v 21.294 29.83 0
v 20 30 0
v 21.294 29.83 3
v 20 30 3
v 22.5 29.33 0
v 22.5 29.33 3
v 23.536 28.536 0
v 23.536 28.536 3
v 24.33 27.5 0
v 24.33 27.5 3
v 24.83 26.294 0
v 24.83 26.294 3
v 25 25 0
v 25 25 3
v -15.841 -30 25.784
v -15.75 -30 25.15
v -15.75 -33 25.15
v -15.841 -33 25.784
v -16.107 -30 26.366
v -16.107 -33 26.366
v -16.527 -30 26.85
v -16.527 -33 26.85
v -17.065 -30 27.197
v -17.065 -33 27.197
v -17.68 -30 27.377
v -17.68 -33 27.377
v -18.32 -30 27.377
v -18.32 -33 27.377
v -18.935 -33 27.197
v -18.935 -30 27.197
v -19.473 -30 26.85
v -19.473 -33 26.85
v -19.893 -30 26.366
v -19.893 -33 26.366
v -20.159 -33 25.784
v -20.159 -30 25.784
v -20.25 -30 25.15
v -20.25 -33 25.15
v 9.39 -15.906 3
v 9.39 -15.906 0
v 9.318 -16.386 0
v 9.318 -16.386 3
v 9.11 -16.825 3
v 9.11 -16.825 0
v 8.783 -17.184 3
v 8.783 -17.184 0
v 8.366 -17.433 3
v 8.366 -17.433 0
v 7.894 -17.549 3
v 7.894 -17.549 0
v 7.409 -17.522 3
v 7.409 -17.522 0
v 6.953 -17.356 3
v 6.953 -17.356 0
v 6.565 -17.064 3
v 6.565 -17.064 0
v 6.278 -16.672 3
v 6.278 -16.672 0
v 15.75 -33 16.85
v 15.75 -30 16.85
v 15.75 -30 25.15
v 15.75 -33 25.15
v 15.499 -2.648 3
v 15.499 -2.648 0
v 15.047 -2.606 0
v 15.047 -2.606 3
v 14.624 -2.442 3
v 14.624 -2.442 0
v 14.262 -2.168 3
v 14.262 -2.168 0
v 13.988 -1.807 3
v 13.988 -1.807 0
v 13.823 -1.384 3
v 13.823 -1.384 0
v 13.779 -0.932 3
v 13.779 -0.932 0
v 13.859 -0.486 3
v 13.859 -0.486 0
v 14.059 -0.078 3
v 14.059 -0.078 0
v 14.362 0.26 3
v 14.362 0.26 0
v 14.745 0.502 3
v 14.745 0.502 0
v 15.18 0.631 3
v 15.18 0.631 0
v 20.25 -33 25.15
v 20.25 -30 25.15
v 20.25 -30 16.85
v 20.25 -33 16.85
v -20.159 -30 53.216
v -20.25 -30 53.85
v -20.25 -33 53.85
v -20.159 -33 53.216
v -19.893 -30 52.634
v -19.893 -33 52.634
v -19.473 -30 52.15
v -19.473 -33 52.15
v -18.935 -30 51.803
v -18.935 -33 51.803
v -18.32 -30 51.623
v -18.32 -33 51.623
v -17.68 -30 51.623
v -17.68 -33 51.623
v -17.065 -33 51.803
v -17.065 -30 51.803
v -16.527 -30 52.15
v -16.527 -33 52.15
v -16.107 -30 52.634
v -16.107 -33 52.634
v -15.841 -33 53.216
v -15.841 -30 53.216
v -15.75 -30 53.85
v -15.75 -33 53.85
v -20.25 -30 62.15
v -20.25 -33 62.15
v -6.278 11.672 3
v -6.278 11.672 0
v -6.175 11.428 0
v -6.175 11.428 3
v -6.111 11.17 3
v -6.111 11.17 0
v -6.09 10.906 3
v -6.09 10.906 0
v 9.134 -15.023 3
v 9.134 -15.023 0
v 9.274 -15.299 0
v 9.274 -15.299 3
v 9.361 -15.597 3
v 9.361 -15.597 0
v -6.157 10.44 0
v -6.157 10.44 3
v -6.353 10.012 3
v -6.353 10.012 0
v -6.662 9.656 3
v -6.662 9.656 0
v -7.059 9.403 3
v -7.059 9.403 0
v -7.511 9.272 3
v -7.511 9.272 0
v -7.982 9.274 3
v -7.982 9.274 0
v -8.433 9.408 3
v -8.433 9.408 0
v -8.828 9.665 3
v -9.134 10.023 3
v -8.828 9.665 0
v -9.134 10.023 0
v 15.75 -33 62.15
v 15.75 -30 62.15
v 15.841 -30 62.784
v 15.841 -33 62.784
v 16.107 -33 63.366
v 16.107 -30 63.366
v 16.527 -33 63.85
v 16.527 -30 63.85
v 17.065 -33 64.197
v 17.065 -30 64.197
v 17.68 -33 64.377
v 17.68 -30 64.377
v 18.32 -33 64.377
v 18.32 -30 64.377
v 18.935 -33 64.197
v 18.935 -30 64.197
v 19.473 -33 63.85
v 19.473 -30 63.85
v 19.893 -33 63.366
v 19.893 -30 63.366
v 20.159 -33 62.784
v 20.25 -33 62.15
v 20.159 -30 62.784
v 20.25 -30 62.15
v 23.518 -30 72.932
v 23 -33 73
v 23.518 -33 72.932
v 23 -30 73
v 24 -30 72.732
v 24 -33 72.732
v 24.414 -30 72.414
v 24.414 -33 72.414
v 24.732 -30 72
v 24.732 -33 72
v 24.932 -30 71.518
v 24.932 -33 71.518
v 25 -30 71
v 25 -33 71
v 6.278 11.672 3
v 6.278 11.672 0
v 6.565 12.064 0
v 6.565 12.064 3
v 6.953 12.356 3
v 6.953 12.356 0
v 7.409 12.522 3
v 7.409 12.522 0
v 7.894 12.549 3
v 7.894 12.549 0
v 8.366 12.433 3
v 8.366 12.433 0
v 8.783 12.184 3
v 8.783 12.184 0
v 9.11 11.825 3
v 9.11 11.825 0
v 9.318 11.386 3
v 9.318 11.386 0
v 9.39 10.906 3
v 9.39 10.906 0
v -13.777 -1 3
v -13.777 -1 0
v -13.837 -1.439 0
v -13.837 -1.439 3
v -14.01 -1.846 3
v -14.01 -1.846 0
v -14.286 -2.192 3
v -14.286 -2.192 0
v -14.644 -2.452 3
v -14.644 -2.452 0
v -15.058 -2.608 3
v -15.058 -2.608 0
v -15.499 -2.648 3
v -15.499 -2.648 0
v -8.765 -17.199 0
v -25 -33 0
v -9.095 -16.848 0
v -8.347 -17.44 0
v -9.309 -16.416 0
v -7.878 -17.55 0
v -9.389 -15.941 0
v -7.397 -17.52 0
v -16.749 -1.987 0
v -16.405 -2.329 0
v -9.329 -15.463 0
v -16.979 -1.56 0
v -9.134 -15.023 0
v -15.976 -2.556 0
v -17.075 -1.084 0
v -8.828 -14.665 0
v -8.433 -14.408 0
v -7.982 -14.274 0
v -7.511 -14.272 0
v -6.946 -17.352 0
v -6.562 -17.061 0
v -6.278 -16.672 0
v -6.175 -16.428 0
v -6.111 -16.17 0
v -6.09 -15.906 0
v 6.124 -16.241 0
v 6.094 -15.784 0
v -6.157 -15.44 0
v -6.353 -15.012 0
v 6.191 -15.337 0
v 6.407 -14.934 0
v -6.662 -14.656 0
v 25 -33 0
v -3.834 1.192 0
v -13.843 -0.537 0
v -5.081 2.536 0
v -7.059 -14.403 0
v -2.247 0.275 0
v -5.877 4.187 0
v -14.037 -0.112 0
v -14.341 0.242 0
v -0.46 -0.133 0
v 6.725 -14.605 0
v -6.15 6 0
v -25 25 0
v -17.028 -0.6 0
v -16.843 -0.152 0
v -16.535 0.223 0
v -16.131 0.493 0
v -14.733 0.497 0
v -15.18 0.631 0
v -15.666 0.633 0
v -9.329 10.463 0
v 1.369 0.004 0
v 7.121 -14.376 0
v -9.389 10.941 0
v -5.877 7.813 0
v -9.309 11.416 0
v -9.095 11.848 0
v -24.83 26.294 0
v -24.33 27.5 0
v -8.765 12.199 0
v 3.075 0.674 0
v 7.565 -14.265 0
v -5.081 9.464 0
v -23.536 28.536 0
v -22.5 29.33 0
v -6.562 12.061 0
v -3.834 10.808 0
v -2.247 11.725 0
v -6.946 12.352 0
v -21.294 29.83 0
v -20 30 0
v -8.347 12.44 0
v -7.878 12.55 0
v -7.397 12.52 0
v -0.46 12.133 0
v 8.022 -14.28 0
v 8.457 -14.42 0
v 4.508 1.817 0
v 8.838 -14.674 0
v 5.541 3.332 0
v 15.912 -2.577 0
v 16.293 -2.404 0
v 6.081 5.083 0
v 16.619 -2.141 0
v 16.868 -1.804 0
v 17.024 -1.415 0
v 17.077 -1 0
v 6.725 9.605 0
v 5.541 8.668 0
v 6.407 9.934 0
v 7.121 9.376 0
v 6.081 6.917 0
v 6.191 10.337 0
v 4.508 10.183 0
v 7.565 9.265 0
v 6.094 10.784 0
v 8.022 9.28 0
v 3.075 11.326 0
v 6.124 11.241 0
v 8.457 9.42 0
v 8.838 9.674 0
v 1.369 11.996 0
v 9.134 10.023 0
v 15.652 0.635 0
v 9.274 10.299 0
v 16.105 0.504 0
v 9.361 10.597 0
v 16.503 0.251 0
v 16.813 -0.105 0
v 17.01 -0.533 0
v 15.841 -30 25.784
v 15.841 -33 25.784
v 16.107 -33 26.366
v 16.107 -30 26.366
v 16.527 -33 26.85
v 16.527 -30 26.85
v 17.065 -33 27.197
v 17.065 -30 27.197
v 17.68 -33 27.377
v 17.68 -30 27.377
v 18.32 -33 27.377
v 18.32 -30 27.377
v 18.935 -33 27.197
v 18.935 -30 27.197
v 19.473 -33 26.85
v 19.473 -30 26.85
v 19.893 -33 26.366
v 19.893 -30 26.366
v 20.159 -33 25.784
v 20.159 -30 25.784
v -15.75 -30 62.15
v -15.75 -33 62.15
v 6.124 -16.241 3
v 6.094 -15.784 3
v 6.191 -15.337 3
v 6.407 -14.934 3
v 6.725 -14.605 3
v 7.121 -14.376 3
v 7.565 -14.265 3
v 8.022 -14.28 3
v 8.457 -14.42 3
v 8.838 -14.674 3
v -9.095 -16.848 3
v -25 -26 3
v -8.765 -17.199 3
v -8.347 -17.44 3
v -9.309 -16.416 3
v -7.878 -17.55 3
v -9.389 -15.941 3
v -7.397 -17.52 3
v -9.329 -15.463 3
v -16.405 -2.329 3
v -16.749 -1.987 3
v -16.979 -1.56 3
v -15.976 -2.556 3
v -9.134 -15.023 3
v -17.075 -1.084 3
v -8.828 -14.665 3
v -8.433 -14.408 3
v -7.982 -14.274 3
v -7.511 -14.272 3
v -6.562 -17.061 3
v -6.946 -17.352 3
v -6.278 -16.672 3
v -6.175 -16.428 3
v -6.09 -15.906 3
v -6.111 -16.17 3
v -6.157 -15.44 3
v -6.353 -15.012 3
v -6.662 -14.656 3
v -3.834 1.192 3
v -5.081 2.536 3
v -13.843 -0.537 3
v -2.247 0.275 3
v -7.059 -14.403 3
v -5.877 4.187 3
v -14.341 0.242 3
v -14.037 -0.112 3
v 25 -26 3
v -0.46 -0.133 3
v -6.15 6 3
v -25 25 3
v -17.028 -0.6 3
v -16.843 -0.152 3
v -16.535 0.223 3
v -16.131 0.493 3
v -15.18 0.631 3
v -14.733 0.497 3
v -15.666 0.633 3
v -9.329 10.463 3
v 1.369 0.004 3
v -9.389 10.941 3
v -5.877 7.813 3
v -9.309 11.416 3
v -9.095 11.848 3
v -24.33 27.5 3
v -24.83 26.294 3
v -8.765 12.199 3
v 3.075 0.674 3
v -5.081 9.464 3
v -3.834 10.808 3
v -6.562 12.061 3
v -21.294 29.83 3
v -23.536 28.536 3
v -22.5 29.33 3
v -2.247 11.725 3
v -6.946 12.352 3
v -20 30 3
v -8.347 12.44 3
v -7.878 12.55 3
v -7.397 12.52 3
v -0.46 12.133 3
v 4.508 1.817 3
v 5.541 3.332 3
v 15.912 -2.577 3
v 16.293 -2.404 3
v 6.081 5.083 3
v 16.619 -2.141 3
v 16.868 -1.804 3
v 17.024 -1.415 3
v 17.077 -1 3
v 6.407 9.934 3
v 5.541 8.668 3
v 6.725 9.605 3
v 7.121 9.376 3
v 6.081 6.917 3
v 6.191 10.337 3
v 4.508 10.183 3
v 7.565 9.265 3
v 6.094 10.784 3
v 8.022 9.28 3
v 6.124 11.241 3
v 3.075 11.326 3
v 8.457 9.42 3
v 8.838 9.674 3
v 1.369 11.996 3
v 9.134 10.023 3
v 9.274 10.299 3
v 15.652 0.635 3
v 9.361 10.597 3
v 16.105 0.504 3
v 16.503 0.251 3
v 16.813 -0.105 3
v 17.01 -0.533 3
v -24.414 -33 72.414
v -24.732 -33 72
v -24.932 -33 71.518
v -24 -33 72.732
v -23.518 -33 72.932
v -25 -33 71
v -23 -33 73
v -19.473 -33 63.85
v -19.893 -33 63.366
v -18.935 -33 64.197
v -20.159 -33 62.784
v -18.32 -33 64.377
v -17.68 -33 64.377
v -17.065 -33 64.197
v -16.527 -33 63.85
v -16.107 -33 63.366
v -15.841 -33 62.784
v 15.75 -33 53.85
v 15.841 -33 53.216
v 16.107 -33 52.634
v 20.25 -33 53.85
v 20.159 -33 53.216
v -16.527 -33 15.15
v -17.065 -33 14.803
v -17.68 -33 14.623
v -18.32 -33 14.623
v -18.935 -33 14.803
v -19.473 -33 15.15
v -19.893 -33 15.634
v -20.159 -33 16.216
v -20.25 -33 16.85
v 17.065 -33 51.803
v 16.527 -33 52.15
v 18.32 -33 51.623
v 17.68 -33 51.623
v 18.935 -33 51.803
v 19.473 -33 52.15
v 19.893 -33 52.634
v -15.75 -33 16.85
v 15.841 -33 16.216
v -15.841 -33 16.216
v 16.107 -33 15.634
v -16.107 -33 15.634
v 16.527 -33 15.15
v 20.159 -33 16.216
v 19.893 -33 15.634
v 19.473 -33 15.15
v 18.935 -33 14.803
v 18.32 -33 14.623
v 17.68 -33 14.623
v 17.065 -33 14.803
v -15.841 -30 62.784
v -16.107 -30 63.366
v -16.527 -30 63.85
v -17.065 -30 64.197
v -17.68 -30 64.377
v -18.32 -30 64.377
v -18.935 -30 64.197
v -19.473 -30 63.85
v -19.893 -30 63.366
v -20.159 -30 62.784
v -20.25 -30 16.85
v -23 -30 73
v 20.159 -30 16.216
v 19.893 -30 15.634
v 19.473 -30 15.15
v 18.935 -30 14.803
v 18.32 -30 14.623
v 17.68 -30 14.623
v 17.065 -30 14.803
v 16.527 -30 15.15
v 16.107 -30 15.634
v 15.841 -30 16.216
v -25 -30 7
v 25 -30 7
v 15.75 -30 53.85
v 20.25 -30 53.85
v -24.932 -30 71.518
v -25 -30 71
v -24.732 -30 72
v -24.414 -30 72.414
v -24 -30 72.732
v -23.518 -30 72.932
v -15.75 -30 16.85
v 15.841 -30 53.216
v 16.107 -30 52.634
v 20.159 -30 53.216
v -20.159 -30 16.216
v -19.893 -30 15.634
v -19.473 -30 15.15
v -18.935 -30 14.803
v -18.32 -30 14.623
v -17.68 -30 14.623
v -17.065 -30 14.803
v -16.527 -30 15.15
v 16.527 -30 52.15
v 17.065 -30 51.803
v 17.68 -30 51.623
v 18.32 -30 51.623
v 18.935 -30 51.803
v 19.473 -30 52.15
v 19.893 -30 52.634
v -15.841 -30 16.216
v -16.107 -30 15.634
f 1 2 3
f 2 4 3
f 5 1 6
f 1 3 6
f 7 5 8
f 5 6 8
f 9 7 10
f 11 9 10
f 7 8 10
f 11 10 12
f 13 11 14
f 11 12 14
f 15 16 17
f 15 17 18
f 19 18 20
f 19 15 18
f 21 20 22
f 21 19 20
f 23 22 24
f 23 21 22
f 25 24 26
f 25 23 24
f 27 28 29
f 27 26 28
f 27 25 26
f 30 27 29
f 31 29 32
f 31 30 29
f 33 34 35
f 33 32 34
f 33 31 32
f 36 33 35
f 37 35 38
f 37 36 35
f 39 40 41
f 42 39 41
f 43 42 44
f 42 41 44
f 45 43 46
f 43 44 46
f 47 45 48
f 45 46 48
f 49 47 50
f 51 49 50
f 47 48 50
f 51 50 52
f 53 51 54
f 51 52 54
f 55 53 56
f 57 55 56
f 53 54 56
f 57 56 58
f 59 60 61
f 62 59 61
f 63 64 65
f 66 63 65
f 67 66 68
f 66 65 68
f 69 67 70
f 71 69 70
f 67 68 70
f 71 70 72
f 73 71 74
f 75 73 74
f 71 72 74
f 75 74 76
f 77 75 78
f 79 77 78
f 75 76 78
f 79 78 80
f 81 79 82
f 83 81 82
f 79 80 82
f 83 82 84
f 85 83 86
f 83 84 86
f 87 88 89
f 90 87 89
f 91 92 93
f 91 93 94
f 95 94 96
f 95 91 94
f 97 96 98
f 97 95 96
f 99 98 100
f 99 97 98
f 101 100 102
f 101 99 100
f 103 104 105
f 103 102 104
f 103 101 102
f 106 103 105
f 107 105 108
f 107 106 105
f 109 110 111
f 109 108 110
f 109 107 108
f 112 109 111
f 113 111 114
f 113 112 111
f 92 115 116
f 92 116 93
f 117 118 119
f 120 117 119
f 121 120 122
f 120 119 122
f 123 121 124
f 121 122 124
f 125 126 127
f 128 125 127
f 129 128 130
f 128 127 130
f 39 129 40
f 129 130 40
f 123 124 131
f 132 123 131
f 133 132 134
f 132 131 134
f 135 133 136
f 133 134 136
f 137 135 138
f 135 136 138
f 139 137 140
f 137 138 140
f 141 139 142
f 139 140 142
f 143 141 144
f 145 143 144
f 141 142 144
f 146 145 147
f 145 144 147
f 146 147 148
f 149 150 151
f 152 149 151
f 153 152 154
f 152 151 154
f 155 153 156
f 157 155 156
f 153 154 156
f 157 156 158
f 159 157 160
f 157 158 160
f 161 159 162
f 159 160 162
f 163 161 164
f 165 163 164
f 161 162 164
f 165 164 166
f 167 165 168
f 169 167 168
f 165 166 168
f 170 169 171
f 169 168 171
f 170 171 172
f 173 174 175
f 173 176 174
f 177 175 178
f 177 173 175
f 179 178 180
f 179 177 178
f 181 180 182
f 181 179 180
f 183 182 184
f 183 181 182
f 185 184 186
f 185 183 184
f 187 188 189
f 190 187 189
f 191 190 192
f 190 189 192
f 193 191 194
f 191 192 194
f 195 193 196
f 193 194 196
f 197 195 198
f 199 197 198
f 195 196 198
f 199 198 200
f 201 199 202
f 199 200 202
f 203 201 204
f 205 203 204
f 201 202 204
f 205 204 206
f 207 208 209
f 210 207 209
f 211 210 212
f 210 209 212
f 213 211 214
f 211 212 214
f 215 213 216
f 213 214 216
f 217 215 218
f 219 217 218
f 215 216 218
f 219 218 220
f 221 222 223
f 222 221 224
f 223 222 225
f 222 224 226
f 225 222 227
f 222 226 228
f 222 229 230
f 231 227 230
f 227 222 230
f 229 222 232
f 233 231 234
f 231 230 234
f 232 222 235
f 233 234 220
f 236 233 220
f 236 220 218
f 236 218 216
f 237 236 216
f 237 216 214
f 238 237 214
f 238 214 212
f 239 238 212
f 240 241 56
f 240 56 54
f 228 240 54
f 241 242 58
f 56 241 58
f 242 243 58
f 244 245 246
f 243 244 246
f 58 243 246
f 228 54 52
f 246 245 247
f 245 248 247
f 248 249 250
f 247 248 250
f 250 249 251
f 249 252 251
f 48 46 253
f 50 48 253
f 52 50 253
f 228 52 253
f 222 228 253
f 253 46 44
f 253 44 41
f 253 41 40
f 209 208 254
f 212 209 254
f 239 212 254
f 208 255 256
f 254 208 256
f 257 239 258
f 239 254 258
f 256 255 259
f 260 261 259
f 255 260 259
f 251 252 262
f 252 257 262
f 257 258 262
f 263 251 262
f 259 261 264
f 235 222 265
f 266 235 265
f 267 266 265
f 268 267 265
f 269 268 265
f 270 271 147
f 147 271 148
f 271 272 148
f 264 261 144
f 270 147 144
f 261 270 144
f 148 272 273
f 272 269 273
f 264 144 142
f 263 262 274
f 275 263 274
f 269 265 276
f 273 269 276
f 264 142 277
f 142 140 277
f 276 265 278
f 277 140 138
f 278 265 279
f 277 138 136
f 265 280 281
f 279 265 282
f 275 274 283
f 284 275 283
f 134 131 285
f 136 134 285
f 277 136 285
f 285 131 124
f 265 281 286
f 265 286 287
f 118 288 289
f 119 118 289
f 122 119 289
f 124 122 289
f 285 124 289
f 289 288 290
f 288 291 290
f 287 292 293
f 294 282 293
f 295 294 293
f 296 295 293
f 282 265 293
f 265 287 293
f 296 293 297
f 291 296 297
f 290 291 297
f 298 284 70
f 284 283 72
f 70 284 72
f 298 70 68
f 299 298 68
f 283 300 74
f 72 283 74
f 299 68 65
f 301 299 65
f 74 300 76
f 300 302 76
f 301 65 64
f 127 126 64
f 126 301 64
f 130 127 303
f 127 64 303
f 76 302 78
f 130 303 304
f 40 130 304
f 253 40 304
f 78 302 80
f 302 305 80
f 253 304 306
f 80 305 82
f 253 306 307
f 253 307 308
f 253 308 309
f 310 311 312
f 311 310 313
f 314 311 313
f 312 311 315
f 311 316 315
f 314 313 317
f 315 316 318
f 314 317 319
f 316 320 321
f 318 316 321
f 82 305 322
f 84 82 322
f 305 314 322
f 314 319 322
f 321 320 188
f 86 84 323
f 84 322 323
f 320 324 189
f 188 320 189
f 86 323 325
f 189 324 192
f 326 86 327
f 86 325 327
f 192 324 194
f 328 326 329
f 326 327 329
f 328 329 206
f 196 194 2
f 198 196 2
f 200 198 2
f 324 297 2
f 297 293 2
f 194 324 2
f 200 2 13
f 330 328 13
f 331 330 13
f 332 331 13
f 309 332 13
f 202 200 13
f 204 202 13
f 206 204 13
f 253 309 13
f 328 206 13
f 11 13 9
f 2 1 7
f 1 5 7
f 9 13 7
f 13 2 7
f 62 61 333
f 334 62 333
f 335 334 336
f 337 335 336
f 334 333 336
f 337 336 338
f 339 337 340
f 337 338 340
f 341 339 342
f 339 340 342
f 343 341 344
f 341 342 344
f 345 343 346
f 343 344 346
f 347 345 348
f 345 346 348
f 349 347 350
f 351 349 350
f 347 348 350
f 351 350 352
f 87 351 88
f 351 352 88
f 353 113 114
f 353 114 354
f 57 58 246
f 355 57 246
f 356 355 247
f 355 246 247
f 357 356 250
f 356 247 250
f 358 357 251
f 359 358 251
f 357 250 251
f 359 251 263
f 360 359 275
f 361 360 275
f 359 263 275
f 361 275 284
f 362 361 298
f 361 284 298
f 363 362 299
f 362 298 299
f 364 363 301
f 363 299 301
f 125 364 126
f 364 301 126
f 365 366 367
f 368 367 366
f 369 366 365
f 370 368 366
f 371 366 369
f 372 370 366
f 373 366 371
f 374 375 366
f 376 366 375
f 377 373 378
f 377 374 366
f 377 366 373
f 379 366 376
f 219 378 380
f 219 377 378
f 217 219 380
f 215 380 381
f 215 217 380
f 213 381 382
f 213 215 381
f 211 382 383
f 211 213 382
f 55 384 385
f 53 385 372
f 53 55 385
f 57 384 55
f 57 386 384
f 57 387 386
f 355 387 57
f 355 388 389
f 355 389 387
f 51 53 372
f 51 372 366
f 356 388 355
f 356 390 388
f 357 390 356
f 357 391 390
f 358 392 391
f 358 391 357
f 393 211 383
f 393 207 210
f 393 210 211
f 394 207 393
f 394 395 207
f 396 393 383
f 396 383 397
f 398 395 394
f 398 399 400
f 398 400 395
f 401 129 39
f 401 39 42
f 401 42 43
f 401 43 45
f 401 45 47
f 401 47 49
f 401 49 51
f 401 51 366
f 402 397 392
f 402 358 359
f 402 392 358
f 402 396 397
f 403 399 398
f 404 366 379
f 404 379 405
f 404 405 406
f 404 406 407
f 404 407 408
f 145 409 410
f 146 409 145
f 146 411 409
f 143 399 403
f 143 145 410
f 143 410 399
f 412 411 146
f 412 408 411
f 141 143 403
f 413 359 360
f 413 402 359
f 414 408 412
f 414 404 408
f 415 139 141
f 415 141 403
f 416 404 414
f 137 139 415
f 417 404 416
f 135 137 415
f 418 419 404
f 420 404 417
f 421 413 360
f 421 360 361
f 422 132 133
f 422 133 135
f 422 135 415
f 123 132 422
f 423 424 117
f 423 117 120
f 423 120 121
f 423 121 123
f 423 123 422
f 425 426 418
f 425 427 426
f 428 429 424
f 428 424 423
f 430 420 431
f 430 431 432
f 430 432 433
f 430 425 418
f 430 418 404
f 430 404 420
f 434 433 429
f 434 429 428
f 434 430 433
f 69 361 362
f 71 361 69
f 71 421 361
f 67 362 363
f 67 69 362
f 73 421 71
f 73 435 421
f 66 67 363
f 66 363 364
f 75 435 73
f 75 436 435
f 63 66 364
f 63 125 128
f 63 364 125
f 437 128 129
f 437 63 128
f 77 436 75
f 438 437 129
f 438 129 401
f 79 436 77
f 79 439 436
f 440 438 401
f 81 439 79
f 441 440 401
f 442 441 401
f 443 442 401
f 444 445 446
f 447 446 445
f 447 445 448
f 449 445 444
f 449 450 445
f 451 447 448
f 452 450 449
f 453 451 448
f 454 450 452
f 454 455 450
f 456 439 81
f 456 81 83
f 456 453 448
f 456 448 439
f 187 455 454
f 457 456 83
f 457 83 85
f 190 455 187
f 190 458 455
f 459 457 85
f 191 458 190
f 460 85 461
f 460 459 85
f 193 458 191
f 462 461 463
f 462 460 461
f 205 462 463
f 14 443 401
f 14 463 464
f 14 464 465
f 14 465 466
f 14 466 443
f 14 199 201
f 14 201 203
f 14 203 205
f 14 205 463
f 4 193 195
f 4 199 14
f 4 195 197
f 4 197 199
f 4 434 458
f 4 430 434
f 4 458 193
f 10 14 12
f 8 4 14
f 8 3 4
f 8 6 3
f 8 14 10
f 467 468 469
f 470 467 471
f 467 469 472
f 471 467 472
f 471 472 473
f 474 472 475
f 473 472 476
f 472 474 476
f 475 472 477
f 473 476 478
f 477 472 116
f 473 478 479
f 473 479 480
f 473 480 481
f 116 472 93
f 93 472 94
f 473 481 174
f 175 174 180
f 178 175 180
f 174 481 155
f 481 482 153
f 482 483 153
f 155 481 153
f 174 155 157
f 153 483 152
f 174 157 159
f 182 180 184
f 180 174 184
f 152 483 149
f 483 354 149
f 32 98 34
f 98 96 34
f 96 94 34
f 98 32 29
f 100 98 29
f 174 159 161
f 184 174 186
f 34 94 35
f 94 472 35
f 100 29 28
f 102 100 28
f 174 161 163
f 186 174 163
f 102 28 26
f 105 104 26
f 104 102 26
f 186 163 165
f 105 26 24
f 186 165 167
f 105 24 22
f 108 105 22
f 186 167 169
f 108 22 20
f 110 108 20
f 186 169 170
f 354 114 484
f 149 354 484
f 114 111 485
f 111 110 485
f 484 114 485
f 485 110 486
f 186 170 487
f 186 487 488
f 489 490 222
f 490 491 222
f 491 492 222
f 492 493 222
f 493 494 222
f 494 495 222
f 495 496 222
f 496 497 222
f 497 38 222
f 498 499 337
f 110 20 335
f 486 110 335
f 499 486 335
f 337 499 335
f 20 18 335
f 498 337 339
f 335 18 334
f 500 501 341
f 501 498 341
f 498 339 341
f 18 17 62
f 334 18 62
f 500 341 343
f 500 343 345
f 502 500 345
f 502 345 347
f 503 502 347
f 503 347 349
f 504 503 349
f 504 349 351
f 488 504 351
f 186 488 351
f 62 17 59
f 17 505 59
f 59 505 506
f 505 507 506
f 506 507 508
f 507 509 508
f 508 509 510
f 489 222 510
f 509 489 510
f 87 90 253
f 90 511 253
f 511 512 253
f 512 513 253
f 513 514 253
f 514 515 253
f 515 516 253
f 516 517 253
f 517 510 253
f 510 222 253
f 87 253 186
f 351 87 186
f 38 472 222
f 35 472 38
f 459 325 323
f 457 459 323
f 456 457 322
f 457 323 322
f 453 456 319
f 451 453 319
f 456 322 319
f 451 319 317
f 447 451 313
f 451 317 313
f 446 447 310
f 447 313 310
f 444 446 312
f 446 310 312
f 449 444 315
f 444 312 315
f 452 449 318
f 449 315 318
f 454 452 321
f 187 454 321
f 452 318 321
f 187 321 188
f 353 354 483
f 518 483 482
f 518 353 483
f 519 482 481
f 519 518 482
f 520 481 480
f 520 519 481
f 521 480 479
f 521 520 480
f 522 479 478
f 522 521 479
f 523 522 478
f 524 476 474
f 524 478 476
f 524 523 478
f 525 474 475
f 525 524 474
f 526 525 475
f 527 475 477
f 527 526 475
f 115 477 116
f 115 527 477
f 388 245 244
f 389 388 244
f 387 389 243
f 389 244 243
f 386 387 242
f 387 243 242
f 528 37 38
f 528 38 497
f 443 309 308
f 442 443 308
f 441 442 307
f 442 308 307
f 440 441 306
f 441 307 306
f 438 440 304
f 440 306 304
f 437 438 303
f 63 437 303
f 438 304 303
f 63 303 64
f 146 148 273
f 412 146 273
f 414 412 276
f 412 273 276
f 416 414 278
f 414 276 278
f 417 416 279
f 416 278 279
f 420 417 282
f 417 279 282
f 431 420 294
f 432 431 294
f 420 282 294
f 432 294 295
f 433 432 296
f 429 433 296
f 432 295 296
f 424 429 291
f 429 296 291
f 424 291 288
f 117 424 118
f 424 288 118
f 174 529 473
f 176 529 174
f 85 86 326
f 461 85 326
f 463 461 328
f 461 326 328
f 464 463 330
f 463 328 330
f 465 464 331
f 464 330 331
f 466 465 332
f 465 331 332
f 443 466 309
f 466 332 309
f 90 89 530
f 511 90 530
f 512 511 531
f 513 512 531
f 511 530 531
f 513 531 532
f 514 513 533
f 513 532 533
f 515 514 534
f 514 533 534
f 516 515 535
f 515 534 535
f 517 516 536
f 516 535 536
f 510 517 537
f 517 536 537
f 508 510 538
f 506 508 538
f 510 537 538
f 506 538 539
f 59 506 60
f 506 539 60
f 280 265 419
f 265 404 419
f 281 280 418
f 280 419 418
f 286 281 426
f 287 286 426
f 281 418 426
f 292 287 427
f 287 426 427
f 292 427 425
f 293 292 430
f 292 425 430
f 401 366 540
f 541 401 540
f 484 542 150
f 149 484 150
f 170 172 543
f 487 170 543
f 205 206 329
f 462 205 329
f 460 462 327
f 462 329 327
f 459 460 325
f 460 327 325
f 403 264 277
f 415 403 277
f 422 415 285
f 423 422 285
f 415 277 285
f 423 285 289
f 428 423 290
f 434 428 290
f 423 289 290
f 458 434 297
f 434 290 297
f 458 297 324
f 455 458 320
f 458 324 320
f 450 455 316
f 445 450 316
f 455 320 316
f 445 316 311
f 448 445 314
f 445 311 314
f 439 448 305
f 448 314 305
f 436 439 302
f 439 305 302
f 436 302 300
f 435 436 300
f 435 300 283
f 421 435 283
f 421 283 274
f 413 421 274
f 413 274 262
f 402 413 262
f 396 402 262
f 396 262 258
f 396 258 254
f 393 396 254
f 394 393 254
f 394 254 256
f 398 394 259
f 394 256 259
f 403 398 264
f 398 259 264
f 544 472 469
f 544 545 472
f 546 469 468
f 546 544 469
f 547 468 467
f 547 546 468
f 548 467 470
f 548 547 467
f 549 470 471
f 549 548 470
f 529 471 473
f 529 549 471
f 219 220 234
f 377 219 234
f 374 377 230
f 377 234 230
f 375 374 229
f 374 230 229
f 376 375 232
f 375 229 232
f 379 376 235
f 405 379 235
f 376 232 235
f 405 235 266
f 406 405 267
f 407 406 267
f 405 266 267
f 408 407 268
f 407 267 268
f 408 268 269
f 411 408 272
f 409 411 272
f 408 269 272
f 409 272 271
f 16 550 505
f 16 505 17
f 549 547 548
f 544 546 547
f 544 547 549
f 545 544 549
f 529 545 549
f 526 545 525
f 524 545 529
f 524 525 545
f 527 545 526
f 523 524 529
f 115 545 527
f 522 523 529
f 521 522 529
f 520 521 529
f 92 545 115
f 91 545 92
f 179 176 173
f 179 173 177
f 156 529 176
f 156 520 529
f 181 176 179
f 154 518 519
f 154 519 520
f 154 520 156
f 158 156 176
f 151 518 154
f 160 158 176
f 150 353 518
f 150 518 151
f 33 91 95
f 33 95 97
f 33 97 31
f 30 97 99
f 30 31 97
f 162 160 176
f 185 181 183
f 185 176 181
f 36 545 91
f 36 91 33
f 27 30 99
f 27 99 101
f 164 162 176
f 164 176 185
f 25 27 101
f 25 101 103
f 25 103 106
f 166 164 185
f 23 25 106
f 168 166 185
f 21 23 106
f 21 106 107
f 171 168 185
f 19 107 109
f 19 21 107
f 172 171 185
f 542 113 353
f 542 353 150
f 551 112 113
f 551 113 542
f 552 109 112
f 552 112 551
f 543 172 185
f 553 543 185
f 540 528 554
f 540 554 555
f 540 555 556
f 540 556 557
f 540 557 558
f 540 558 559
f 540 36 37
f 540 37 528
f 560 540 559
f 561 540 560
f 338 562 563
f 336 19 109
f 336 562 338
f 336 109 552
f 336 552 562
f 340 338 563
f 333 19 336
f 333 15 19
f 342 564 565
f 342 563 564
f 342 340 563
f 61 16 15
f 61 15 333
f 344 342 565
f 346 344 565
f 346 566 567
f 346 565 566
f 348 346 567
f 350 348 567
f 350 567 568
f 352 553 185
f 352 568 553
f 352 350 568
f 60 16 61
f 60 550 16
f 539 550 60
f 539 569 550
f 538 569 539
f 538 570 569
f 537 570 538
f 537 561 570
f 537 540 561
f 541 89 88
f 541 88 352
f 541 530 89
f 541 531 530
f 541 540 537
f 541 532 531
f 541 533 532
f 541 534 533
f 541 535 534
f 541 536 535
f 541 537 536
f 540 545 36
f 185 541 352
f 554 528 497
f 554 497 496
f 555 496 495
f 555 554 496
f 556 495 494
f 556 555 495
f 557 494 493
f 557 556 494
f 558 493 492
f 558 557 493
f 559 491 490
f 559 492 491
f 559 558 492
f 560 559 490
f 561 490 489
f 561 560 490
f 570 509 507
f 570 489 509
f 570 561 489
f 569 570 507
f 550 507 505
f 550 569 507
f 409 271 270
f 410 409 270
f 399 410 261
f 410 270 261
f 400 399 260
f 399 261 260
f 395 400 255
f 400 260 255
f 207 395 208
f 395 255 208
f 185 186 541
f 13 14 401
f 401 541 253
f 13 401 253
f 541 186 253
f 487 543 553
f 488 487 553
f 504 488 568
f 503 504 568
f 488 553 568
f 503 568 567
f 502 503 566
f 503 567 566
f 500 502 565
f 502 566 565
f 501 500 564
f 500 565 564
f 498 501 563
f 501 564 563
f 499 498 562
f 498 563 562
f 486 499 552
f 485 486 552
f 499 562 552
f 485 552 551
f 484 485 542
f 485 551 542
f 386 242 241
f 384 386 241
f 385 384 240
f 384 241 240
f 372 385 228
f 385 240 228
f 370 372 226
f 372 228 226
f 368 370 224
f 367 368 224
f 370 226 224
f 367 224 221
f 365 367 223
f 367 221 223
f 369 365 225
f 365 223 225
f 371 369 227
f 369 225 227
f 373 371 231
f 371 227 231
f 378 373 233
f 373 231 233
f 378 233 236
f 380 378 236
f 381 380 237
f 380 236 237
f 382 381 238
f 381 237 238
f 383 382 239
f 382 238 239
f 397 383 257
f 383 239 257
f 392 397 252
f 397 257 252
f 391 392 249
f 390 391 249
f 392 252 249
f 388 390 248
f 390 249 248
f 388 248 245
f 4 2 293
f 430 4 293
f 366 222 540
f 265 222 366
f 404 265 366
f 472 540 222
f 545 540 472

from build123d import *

# Parameters (mm, degrees)
EXTRUDE_2_DEPTH     = 3
SKETCH_2_W          = 50
SKETCH_2_H          = 3
EXTRUDE_3_DEPTH     = 3
SKETCH_3_W          = 50
SKETCH_3_H          = 3
EXTRUDE_5_DEPTH     = 70
CUT_EXTRUDE_1_DEPTH = 98.744565066
FILLET_1_R          = 5
FILLET_2_R          = 2
SKETCH_5_W          = 4
SKETCH_5_H          = 4
EXTRUDE_6_DEPTH     = 4
SKETCH_6_W          = 4
SKETCH_6_H          = 4
EXTRUDE_7_DEPTH     = 46
CUT_EXTRUDE_2_DEPTH = 95.435162943


with BuildPart() as part:
    # 草图1 → 凸台-拉伸2 (new body)
    with BuildSketch(Plane.XY):
        with BuildLine():
            Line((25, 6), (25, 30))
            Line((25, 30), (-25, 30))
            Line((-25, 30), (-25, 6))
            Line((-25, 6), (-16.431676725, 6))
            ThreePointArc((-16.431676725, 6), (0, 16), (16.431676725, 6))
            Line((16.431676725, 6), (25, 6))
        make_face()
        with BuildLine():
            Line((25, -30), (25, -1))
            Line((25, -1), (18.439088915, -1))
            ThreePointArc((18.439088915, -1), (18.484765956, -1.749381895), (18.5, -2.5))
            ThreePointArc((18.5, -2.5), (-4.374013065, -20.475483574), (-16.431676725, 6))
            Line((-16.431676725, 6), (-25, 6))
            Line((-25, 6), (-25, -30))
            Line((-25, -30), (25, -30))
        make_face()
        with BuildLine():
            Line((25, -1), (25, 6))
            Line((25, 6), (16.431676725, 6))
            ThreePointArc((16.431676725, 6), (17.783210455, 2.599747633), (18.439088915, -1))
            Line((18.439088915, -1), (25, -1))
        make_face()
        with BuildLine():
            ThreePointArc((18.5, -2.5), (18.484765956, -1.749381895), (18.439088915, -1))
            Line((18.439088915, -1), (17.077248621, -1))
            ThreePointArc((17.077248621, -1), (16.619172939, -2.1409717), (15.499289324, -2.648426564))
            ThreePointArc((15.499289324, -2.648426564), (13.783292906, -9.590192993), (9.133777755, -15.022943101))
            ThreePointArc((9.133777755, -15.022943101), (9.324554056, -15.446200161), (9.389869855, -15.905847832))
            ThreePointArc((9.389869855, -15.905847832), (8.134145395, -17.508048443), (6.278297978, -16.671555119))
            ThreePointArc((6.278297978, -16.671555119), (0, -18), (-6.278297978, -16.671555119))
            ThreePointArc((-6.278297978, -16.671555119), (-8.564869855, -17.334789748), (-9.133777755, -15.022943101))
            ThreePointArc((-9.133777755, -15.022943101), (-13.783292906, -9.590192993), (-15.499289324, -2.648426564))
            ThreePointArc((-15.499289324, -2.648426564), (-17.069504119, -0.840322581), (-15.18038717, 0.631428645))
            ThreePointArc((-15.18038717, 0.631428645), (-14.324684332, 3.420592774), (-12.961481397, 6))
            Line((-12.961481397, 6), (-16.431676725, 6))
            ThreePointArc((-16.431676725, 6), (-4.374013065, -20.475483574), (18.5, -2.5))
        make_face()
        with BuildLine():
            Line((12.961481397, 6), (16.431676725, 6))
            ThreePointArc((16.431676725, 6), (0, 16), (-16.431676725, 6))
            Line((-16.431676725, 6), (-12.961481397, 6))
            ThreePointArc((-12.961481397, 6), (-11.229253628, 8.184281115), (-9.133777755, 10.022943101))
            ThreePointArc((-9.133777755, 10.022943101), (-8.564869855, 12.334789748), (-6.278297978, 11.671555119))
            ThreePointArc((-6.278297978, 11.671555119), (0, 13), (6.278297978, 11.671555119))
            ThreePointArc((6.278297978, 11.671555119), (8.134145395, 12.508048443), (9.389869855, 10.905847832))
            ThreePointArc((9.389869855, 10.905847832), (9.324554056, 10.446200161), (9.133777755, 10.022943101))
            ThreePointArc((9.133777755, 10.022943101), (11.229253628, 8.184281115), (12.961481397, 6))
        make_face()
        with BuildLine():
            ThreePointArc((15.18038717, 0.631428645), (14.324684332, 3.420592774), (12.961481397, 6))
            Line((12.961481397, 6), (6.15, 6))
            ThreePointArc((6.15, 6), (0, -0.15), (-6.15, 6))
            Line((-6.15, 6), (-12.961481397, 6))
            ThreePointArc((-12.961481397, 6), (-14.324684332, 3.420592774), (-15.18038717, 0.631428645))
            ThreePointArc((-15.18038717, 0.631428645), (-14.176284714, 0.075913242), (-13.777248621, -1))
            ThreePointArc((-13.777248621, -1), (-14.286276921, -2.191924318), (-15.499289324, -2.648426564))
            ThreePointArc((-15.499289324, -2.648426564), (-13.783292906, -9.590192993), (-9.133777755, -15.022943101))
            ThreePointArc((-9.133777755, -15.022943101), (-7.280222183, -14.321163631), (-6.089869855, -15.905847832))
            ThreePointArc((-6.089869855, -15.905847832), (-6.137669243, -16.300123373), (-6.278297978, -16.671555119))
            ThreePointArc((-6.278297978, -16.671555119), (0, -18), (6.278297978, -16.671555119))
            ThreePointArc((6.278297978, -16.671555119), (6.914869855, -14.476905916), (9.133777755, -15.022943101))
            ThreePointArc((9.133777755, -15.022943101), (13.783292906, -9.590192993), (15.499289324, -2.648426564))
            ThreePointArc((15.499289324, -2.648426564), (13.784993122, -1.159677419), (15.18038717, 0.631428645))
        make_face()
        with BuildLine():
            Line((6.15, 6), (12.961481397, 6))
            ThreePointArc((12.961481397, 6), (11.229253628, 8.184281115), (9.133777755, 10.022943101))
            ThreePointArc((9.133777755, 10.022943101), (6.914869855, 9.476905916), (6.278297978, 11.671555119))
            ThreePointArc((6.278297978, 11.671555119), (0, 13), (-6.278297978, 11.671555119))
            ThreePointArc((-6.278297978, 11.671555119), (-6.137669243, 11.300123373), (-6.089869855, 10.905847832))
            ThreePointArc((-6.089869855, 10.905847832), (-7.280222183, 9.321163631), (-9.133777755, 10.022943101))
            ThreePointArc((-9.133777755, 10.022943101), (-11.229253628, 8.184281115), (-12.961481397, 6))
            Line((-12.961481397, 6), (-6.15, 6))
            ThreePointArc((-6.15, 6), (0, 12.15), (6.15, 6))
        make_face()
        with BuildLine():
            ThreePointArc((18.439088915, -1), (17.783210455, 2.599747633), (16.431676725, 6))
            Line((16.431676725, 6), (12.961481397, 6))
            ThreePointArc((12.961481397, 6), (14.324684332, 3.420592774), (15.18038717, 0.631428645))
            ThreePointArc((15.18038717, 0.631428645), (16.503161862, 0.250963907), (17.077248621, -1))
            Line((17.077248621, -1), (18.439088915, -1))
        make_face()
    extrude(amount=EXTRUDE_2_DEPTH)

    # 草图2 → 凸台-拉伸3 (add)
    with BuildSketch(Plane.XZ.offset(30)):
        with Locations((0, 1.5)):
            Rectangle(SKETCH_2_W, SKETCH_2_H)
    extrude(amount=EXTRUDE_3_DEPTH)

    # 草图3 → 凸台-拉伸5 (add)
    with BuildSketch(Plane.XY.offset(3)):
        with Locations((0, -31.5)):
            Rectangle(SKETCH_3_W, SKETCH_3_H)
    extrude(amount=EXTRUDE_5_DEPTH)

    # 草图4 → 切除-拉伸1 (cut, through all)
    with BuildSketch(Plane(origin=(0, -30, 0), x_dir=(1, 0, 0), z_dir=(0, 1, 0))):
        with BuildLine():
            Line((-15.75, -53.85), (-15.75, -62.15))
            ThreePointArc((-15.75, -62.15), (-18, -64.4), (-20.25, -62.15))
            Line((-20.25, -62.15), (-20.25, -53.85))
            ThreePointArc((-20.25, -53.85), (-18, -51.6), (-15.75, -53.85))
        make_face()
        with BuildLine():
            Line((15.75, -53.85), (15.75, -62.15))
            ThreePointArc((15.75, -62.15), (18, -64.4), (20.25, -62.15))
            Line((20.25, -62.15), (20.25, -53.85))
            ThreePointArc((20.25, -53.85), (18, -51.6), (15.75, -53.85))
        make_face()
        with BuildLine():
            Line((-15.75, -16.85), (-15.75, -25.15))
            ThreePointArc((-15.75, -25.15), (-18, -27.4), (-20.25, -25.15))
            Line((-20.25, -25.15), (-20.25, -16.85))
            ThreePointArc((-20.25, -16.85), (-18, -14.6), (-15.75, -16.85))
        make_face()
        with BuildLine():
            Line((15.75, -16.85), (15.75, -25.15))
            ThreePointArc((15.75, -25.15), (18, -27.4), (20.25, -25.15))
            Line((20.25, -25.15), (20.25, -16.85))
            ThreePointArc((20.25, -16.85), (18, -14.6), (15.75, -16.85))
        make_face()
    extrude(amount=-CUT_EXTRUDE_1_DEPTH, mode=Mode.SUBTRACT)

    # 圆角1
    fillet_1_edges = [part.edges().sort_by_distance(p)[0] for p in [
        (-25, 30, 1.5),
        (25, 30, 1.5),
    ]]
    fillet(fillet_1_edges, radius=FILLET_1_R)

    # 圆角2
    fillet_2_edges = [part.edges().sort_by_distance(p)[0] for p in [
        (25, -31.5, 73),
        (-25, -31.5, 73),
    ]]
    fillet(fillet_2_edges, radius=FILLET_2_R)

    # 草图5 → 凸台-拉伸6 (add)
    with BuildSketch(Plane(origin=(0, -30, 0), x_dir=(1, 0, 0), z_dir=(0, 1, 0))):
        with Locations((23, -5)):
            Rectangle(SKETCH_5_W, SKETCH_5_H)
    extrude(amount=EXTRUDE_6_DEPTH)

    # 草图6 → 凸台-拉伸7 (add)
    with BuildSketch(Plane.ZY.offset(-21)):
        with Locations((5, -28)):
            Rectangle(SKETCH_6_W, SKETCH_6_H)
    extrude(amount=EXTRUDE_7_DEPTH)

    # 草图7 → 切除-拉伸2 (cut, through all)
    with BuildSketch(Plane(origin=(25, 0, 0), x_dir=(0, 0, -1), z_dir=(1, 0, 0))):
        Polygon((-7, -30), (-7, -26), (-3, -26), align=None)
    extrude(amount=-CUT_EXTRUDE_2_DEPTH, mode=Mode.SUBTRACT)


solid = part.part
